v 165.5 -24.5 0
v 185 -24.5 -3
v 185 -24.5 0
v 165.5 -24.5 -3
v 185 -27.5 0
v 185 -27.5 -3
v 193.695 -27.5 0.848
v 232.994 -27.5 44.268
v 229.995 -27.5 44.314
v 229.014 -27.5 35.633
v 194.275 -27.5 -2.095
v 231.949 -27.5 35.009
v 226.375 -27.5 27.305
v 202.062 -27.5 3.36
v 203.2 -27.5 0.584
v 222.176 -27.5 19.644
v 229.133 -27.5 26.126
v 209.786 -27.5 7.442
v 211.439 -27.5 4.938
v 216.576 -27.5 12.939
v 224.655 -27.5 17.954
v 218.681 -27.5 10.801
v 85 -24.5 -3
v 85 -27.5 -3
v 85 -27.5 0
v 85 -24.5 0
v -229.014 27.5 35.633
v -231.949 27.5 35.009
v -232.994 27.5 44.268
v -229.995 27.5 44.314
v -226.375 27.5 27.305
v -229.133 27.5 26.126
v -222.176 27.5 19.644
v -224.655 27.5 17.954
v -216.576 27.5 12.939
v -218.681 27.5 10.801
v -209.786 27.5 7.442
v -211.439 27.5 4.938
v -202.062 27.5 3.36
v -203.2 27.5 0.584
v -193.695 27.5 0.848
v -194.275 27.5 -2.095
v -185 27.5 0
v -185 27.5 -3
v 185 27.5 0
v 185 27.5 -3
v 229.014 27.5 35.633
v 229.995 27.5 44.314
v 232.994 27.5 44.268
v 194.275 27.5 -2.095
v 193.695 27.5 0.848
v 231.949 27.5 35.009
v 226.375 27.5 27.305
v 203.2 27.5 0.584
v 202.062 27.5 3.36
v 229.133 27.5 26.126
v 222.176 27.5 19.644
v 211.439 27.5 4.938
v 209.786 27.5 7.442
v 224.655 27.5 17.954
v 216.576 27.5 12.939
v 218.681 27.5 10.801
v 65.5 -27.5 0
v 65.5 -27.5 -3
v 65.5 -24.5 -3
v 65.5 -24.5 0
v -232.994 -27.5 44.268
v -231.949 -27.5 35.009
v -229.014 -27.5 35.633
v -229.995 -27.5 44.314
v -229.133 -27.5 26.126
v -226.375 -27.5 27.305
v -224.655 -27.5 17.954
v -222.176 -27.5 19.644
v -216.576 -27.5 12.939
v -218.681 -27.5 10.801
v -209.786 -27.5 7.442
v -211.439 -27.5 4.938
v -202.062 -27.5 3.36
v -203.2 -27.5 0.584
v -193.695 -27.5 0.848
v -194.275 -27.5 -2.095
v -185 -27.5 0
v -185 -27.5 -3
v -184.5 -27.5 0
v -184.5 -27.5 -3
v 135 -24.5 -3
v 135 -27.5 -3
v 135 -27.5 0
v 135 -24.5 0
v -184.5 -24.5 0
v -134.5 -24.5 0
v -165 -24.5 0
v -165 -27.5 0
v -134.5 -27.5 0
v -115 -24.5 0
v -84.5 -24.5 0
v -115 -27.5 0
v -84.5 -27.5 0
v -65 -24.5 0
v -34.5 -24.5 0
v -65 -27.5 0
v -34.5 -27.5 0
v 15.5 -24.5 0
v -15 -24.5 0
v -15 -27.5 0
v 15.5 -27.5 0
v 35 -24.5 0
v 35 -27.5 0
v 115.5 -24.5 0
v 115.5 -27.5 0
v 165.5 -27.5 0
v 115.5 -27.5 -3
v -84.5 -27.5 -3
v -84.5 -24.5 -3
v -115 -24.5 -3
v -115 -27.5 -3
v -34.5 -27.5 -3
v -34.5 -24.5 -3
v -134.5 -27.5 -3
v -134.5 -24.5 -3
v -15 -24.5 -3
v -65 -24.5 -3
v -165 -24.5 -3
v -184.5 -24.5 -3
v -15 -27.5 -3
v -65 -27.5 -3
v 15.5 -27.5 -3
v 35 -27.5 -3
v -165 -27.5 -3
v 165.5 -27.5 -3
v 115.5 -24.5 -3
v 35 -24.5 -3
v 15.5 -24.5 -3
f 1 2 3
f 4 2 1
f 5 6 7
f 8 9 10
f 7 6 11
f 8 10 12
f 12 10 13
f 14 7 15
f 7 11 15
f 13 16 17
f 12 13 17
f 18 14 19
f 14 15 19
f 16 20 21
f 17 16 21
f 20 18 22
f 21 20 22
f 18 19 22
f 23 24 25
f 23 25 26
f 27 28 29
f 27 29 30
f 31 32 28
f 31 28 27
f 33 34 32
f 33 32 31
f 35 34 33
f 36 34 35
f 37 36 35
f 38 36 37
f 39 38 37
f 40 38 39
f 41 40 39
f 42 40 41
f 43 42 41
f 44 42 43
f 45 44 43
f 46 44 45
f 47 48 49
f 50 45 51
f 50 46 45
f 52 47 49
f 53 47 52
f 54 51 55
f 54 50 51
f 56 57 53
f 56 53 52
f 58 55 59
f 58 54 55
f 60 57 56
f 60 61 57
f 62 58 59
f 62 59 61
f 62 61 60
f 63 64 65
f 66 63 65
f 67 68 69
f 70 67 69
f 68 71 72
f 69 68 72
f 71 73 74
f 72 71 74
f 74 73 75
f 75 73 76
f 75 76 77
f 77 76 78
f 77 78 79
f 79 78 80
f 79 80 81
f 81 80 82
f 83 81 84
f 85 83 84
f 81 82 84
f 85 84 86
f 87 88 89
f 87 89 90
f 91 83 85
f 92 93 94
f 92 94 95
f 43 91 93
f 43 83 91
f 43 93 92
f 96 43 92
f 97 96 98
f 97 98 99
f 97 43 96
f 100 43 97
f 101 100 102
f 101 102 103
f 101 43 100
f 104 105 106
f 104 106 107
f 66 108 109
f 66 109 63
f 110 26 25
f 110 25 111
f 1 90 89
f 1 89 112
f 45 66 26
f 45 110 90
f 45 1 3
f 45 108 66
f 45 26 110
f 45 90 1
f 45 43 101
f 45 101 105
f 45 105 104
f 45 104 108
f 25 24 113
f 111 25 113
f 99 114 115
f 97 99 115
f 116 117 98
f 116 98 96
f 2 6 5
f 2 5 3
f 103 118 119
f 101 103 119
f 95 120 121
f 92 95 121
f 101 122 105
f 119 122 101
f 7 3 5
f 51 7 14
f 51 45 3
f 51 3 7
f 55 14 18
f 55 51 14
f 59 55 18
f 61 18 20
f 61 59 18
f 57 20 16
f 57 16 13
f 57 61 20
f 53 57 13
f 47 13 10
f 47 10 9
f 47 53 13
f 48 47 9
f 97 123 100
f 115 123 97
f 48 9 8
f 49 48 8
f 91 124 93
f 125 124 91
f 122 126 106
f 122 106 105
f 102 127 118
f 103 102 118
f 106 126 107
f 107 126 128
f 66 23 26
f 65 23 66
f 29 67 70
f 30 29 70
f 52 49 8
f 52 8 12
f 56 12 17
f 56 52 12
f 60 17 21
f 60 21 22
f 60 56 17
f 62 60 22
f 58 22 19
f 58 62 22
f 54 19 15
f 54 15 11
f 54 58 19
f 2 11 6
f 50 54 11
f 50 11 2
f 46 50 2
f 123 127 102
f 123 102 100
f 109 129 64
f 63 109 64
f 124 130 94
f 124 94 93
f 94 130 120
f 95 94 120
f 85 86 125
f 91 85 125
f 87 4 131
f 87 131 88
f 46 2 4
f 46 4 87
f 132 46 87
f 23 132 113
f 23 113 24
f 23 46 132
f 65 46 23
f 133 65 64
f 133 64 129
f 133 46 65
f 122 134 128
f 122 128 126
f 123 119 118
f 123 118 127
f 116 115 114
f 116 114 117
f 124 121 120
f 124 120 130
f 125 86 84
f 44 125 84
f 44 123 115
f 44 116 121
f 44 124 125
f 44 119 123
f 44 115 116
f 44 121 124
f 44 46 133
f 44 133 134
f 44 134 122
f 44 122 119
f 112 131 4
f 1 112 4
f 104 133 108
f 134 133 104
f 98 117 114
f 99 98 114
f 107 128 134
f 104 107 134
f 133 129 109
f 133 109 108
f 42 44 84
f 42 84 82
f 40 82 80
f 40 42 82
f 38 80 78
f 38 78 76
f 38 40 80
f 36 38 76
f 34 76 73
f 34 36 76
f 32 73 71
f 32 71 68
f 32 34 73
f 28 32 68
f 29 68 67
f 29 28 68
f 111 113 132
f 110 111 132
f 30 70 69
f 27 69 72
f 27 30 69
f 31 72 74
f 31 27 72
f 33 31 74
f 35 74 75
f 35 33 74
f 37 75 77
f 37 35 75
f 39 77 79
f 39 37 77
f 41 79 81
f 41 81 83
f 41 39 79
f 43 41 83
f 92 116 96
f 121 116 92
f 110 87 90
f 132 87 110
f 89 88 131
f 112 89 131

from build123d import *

# Parameters (mm, degrees)
BOSS_EXTRUDE4_DEPTH = 27.5
SKETCH2_W           = 19.5
SKETCH2_H           = 3
CUT_EXTRUDE1_DEPTH  = 240.335089361


with BuildPart() as part:
    # Sketch1 → Boss-Extrude4 (new, symmetric)
    with BuildSketch(Plane(origin=(0, 0, 0), x_dir=(1, 0, 0), z_dir=(0, 1, 0))):
        with BuildLine():
            Line((-185, 0), (185, 0))
            ThreePointArc((185, 0), (216.576404427, -12.938641896), (229.994773776, -44.314191845))
            Line((229.994773776, -44.314191845), (232.994425361, -44.268471301))
            ThreePointArc((232.994425361, -44.268471301), (218.681498055, -10.801218022), (185, 3))
            Line((185, 3), (-185, 3))
            ThreePointArc((-185, 3), (-218.681498055, -10.801218022), (-232.994425361, -44.268471301))
            Line((-232.994425361, -44.268471301), (-229.994773776, -44.314191845))
            ThreePointArc((-229.994773776, -44.314191845), (-216.576404427, -12.938641896), (-185, 0))
        make_face()
    extrude(amount=BOSS_EXTRUDE4_DEPTH, both=True)

    # Sketch2 → Cut-Extrude1 (cut, through all)
    with BuildSketch(Plane(origin=(0, 0, -3), x_dir=(-1, 0, 0), z_dir=(0, 0, -1))):
        with Locations((-125.25, -26)):
            Rectangle(SKETCH2_W, SKETCH2_H)
        with Locations((-175.25, -26)):
            Rectangle(SKETCH2_W, SKETCH2_H)
        with Locations((-75.25, -26)):
            Rectangle(SKETCH2_W, SKETCH2_H)
        with Locations((-25.25, -26)):
            Rectangle(SKETCH2_W, SKETCH2_H)
        with Locations((24.75, -26)):
            Rectangle(SKETCH2_W, SKETCH2_H)
        with Locations((74.75, -26)):
            Rectangle(SKETCH2_W, SKETCH2_H)
        with Locations((124.75, -26)):
            Rectangle(SKETCH2_W, SKETCH2_H)
        with Locations((174.75, -26)):
            Rectangle(SKETCH2_W, SKETCH2_H)
    extrude(amount=-CUT_EXTRUDE1_DEPTH, mode=Mode.SUBTRACT)


solid = part.part
